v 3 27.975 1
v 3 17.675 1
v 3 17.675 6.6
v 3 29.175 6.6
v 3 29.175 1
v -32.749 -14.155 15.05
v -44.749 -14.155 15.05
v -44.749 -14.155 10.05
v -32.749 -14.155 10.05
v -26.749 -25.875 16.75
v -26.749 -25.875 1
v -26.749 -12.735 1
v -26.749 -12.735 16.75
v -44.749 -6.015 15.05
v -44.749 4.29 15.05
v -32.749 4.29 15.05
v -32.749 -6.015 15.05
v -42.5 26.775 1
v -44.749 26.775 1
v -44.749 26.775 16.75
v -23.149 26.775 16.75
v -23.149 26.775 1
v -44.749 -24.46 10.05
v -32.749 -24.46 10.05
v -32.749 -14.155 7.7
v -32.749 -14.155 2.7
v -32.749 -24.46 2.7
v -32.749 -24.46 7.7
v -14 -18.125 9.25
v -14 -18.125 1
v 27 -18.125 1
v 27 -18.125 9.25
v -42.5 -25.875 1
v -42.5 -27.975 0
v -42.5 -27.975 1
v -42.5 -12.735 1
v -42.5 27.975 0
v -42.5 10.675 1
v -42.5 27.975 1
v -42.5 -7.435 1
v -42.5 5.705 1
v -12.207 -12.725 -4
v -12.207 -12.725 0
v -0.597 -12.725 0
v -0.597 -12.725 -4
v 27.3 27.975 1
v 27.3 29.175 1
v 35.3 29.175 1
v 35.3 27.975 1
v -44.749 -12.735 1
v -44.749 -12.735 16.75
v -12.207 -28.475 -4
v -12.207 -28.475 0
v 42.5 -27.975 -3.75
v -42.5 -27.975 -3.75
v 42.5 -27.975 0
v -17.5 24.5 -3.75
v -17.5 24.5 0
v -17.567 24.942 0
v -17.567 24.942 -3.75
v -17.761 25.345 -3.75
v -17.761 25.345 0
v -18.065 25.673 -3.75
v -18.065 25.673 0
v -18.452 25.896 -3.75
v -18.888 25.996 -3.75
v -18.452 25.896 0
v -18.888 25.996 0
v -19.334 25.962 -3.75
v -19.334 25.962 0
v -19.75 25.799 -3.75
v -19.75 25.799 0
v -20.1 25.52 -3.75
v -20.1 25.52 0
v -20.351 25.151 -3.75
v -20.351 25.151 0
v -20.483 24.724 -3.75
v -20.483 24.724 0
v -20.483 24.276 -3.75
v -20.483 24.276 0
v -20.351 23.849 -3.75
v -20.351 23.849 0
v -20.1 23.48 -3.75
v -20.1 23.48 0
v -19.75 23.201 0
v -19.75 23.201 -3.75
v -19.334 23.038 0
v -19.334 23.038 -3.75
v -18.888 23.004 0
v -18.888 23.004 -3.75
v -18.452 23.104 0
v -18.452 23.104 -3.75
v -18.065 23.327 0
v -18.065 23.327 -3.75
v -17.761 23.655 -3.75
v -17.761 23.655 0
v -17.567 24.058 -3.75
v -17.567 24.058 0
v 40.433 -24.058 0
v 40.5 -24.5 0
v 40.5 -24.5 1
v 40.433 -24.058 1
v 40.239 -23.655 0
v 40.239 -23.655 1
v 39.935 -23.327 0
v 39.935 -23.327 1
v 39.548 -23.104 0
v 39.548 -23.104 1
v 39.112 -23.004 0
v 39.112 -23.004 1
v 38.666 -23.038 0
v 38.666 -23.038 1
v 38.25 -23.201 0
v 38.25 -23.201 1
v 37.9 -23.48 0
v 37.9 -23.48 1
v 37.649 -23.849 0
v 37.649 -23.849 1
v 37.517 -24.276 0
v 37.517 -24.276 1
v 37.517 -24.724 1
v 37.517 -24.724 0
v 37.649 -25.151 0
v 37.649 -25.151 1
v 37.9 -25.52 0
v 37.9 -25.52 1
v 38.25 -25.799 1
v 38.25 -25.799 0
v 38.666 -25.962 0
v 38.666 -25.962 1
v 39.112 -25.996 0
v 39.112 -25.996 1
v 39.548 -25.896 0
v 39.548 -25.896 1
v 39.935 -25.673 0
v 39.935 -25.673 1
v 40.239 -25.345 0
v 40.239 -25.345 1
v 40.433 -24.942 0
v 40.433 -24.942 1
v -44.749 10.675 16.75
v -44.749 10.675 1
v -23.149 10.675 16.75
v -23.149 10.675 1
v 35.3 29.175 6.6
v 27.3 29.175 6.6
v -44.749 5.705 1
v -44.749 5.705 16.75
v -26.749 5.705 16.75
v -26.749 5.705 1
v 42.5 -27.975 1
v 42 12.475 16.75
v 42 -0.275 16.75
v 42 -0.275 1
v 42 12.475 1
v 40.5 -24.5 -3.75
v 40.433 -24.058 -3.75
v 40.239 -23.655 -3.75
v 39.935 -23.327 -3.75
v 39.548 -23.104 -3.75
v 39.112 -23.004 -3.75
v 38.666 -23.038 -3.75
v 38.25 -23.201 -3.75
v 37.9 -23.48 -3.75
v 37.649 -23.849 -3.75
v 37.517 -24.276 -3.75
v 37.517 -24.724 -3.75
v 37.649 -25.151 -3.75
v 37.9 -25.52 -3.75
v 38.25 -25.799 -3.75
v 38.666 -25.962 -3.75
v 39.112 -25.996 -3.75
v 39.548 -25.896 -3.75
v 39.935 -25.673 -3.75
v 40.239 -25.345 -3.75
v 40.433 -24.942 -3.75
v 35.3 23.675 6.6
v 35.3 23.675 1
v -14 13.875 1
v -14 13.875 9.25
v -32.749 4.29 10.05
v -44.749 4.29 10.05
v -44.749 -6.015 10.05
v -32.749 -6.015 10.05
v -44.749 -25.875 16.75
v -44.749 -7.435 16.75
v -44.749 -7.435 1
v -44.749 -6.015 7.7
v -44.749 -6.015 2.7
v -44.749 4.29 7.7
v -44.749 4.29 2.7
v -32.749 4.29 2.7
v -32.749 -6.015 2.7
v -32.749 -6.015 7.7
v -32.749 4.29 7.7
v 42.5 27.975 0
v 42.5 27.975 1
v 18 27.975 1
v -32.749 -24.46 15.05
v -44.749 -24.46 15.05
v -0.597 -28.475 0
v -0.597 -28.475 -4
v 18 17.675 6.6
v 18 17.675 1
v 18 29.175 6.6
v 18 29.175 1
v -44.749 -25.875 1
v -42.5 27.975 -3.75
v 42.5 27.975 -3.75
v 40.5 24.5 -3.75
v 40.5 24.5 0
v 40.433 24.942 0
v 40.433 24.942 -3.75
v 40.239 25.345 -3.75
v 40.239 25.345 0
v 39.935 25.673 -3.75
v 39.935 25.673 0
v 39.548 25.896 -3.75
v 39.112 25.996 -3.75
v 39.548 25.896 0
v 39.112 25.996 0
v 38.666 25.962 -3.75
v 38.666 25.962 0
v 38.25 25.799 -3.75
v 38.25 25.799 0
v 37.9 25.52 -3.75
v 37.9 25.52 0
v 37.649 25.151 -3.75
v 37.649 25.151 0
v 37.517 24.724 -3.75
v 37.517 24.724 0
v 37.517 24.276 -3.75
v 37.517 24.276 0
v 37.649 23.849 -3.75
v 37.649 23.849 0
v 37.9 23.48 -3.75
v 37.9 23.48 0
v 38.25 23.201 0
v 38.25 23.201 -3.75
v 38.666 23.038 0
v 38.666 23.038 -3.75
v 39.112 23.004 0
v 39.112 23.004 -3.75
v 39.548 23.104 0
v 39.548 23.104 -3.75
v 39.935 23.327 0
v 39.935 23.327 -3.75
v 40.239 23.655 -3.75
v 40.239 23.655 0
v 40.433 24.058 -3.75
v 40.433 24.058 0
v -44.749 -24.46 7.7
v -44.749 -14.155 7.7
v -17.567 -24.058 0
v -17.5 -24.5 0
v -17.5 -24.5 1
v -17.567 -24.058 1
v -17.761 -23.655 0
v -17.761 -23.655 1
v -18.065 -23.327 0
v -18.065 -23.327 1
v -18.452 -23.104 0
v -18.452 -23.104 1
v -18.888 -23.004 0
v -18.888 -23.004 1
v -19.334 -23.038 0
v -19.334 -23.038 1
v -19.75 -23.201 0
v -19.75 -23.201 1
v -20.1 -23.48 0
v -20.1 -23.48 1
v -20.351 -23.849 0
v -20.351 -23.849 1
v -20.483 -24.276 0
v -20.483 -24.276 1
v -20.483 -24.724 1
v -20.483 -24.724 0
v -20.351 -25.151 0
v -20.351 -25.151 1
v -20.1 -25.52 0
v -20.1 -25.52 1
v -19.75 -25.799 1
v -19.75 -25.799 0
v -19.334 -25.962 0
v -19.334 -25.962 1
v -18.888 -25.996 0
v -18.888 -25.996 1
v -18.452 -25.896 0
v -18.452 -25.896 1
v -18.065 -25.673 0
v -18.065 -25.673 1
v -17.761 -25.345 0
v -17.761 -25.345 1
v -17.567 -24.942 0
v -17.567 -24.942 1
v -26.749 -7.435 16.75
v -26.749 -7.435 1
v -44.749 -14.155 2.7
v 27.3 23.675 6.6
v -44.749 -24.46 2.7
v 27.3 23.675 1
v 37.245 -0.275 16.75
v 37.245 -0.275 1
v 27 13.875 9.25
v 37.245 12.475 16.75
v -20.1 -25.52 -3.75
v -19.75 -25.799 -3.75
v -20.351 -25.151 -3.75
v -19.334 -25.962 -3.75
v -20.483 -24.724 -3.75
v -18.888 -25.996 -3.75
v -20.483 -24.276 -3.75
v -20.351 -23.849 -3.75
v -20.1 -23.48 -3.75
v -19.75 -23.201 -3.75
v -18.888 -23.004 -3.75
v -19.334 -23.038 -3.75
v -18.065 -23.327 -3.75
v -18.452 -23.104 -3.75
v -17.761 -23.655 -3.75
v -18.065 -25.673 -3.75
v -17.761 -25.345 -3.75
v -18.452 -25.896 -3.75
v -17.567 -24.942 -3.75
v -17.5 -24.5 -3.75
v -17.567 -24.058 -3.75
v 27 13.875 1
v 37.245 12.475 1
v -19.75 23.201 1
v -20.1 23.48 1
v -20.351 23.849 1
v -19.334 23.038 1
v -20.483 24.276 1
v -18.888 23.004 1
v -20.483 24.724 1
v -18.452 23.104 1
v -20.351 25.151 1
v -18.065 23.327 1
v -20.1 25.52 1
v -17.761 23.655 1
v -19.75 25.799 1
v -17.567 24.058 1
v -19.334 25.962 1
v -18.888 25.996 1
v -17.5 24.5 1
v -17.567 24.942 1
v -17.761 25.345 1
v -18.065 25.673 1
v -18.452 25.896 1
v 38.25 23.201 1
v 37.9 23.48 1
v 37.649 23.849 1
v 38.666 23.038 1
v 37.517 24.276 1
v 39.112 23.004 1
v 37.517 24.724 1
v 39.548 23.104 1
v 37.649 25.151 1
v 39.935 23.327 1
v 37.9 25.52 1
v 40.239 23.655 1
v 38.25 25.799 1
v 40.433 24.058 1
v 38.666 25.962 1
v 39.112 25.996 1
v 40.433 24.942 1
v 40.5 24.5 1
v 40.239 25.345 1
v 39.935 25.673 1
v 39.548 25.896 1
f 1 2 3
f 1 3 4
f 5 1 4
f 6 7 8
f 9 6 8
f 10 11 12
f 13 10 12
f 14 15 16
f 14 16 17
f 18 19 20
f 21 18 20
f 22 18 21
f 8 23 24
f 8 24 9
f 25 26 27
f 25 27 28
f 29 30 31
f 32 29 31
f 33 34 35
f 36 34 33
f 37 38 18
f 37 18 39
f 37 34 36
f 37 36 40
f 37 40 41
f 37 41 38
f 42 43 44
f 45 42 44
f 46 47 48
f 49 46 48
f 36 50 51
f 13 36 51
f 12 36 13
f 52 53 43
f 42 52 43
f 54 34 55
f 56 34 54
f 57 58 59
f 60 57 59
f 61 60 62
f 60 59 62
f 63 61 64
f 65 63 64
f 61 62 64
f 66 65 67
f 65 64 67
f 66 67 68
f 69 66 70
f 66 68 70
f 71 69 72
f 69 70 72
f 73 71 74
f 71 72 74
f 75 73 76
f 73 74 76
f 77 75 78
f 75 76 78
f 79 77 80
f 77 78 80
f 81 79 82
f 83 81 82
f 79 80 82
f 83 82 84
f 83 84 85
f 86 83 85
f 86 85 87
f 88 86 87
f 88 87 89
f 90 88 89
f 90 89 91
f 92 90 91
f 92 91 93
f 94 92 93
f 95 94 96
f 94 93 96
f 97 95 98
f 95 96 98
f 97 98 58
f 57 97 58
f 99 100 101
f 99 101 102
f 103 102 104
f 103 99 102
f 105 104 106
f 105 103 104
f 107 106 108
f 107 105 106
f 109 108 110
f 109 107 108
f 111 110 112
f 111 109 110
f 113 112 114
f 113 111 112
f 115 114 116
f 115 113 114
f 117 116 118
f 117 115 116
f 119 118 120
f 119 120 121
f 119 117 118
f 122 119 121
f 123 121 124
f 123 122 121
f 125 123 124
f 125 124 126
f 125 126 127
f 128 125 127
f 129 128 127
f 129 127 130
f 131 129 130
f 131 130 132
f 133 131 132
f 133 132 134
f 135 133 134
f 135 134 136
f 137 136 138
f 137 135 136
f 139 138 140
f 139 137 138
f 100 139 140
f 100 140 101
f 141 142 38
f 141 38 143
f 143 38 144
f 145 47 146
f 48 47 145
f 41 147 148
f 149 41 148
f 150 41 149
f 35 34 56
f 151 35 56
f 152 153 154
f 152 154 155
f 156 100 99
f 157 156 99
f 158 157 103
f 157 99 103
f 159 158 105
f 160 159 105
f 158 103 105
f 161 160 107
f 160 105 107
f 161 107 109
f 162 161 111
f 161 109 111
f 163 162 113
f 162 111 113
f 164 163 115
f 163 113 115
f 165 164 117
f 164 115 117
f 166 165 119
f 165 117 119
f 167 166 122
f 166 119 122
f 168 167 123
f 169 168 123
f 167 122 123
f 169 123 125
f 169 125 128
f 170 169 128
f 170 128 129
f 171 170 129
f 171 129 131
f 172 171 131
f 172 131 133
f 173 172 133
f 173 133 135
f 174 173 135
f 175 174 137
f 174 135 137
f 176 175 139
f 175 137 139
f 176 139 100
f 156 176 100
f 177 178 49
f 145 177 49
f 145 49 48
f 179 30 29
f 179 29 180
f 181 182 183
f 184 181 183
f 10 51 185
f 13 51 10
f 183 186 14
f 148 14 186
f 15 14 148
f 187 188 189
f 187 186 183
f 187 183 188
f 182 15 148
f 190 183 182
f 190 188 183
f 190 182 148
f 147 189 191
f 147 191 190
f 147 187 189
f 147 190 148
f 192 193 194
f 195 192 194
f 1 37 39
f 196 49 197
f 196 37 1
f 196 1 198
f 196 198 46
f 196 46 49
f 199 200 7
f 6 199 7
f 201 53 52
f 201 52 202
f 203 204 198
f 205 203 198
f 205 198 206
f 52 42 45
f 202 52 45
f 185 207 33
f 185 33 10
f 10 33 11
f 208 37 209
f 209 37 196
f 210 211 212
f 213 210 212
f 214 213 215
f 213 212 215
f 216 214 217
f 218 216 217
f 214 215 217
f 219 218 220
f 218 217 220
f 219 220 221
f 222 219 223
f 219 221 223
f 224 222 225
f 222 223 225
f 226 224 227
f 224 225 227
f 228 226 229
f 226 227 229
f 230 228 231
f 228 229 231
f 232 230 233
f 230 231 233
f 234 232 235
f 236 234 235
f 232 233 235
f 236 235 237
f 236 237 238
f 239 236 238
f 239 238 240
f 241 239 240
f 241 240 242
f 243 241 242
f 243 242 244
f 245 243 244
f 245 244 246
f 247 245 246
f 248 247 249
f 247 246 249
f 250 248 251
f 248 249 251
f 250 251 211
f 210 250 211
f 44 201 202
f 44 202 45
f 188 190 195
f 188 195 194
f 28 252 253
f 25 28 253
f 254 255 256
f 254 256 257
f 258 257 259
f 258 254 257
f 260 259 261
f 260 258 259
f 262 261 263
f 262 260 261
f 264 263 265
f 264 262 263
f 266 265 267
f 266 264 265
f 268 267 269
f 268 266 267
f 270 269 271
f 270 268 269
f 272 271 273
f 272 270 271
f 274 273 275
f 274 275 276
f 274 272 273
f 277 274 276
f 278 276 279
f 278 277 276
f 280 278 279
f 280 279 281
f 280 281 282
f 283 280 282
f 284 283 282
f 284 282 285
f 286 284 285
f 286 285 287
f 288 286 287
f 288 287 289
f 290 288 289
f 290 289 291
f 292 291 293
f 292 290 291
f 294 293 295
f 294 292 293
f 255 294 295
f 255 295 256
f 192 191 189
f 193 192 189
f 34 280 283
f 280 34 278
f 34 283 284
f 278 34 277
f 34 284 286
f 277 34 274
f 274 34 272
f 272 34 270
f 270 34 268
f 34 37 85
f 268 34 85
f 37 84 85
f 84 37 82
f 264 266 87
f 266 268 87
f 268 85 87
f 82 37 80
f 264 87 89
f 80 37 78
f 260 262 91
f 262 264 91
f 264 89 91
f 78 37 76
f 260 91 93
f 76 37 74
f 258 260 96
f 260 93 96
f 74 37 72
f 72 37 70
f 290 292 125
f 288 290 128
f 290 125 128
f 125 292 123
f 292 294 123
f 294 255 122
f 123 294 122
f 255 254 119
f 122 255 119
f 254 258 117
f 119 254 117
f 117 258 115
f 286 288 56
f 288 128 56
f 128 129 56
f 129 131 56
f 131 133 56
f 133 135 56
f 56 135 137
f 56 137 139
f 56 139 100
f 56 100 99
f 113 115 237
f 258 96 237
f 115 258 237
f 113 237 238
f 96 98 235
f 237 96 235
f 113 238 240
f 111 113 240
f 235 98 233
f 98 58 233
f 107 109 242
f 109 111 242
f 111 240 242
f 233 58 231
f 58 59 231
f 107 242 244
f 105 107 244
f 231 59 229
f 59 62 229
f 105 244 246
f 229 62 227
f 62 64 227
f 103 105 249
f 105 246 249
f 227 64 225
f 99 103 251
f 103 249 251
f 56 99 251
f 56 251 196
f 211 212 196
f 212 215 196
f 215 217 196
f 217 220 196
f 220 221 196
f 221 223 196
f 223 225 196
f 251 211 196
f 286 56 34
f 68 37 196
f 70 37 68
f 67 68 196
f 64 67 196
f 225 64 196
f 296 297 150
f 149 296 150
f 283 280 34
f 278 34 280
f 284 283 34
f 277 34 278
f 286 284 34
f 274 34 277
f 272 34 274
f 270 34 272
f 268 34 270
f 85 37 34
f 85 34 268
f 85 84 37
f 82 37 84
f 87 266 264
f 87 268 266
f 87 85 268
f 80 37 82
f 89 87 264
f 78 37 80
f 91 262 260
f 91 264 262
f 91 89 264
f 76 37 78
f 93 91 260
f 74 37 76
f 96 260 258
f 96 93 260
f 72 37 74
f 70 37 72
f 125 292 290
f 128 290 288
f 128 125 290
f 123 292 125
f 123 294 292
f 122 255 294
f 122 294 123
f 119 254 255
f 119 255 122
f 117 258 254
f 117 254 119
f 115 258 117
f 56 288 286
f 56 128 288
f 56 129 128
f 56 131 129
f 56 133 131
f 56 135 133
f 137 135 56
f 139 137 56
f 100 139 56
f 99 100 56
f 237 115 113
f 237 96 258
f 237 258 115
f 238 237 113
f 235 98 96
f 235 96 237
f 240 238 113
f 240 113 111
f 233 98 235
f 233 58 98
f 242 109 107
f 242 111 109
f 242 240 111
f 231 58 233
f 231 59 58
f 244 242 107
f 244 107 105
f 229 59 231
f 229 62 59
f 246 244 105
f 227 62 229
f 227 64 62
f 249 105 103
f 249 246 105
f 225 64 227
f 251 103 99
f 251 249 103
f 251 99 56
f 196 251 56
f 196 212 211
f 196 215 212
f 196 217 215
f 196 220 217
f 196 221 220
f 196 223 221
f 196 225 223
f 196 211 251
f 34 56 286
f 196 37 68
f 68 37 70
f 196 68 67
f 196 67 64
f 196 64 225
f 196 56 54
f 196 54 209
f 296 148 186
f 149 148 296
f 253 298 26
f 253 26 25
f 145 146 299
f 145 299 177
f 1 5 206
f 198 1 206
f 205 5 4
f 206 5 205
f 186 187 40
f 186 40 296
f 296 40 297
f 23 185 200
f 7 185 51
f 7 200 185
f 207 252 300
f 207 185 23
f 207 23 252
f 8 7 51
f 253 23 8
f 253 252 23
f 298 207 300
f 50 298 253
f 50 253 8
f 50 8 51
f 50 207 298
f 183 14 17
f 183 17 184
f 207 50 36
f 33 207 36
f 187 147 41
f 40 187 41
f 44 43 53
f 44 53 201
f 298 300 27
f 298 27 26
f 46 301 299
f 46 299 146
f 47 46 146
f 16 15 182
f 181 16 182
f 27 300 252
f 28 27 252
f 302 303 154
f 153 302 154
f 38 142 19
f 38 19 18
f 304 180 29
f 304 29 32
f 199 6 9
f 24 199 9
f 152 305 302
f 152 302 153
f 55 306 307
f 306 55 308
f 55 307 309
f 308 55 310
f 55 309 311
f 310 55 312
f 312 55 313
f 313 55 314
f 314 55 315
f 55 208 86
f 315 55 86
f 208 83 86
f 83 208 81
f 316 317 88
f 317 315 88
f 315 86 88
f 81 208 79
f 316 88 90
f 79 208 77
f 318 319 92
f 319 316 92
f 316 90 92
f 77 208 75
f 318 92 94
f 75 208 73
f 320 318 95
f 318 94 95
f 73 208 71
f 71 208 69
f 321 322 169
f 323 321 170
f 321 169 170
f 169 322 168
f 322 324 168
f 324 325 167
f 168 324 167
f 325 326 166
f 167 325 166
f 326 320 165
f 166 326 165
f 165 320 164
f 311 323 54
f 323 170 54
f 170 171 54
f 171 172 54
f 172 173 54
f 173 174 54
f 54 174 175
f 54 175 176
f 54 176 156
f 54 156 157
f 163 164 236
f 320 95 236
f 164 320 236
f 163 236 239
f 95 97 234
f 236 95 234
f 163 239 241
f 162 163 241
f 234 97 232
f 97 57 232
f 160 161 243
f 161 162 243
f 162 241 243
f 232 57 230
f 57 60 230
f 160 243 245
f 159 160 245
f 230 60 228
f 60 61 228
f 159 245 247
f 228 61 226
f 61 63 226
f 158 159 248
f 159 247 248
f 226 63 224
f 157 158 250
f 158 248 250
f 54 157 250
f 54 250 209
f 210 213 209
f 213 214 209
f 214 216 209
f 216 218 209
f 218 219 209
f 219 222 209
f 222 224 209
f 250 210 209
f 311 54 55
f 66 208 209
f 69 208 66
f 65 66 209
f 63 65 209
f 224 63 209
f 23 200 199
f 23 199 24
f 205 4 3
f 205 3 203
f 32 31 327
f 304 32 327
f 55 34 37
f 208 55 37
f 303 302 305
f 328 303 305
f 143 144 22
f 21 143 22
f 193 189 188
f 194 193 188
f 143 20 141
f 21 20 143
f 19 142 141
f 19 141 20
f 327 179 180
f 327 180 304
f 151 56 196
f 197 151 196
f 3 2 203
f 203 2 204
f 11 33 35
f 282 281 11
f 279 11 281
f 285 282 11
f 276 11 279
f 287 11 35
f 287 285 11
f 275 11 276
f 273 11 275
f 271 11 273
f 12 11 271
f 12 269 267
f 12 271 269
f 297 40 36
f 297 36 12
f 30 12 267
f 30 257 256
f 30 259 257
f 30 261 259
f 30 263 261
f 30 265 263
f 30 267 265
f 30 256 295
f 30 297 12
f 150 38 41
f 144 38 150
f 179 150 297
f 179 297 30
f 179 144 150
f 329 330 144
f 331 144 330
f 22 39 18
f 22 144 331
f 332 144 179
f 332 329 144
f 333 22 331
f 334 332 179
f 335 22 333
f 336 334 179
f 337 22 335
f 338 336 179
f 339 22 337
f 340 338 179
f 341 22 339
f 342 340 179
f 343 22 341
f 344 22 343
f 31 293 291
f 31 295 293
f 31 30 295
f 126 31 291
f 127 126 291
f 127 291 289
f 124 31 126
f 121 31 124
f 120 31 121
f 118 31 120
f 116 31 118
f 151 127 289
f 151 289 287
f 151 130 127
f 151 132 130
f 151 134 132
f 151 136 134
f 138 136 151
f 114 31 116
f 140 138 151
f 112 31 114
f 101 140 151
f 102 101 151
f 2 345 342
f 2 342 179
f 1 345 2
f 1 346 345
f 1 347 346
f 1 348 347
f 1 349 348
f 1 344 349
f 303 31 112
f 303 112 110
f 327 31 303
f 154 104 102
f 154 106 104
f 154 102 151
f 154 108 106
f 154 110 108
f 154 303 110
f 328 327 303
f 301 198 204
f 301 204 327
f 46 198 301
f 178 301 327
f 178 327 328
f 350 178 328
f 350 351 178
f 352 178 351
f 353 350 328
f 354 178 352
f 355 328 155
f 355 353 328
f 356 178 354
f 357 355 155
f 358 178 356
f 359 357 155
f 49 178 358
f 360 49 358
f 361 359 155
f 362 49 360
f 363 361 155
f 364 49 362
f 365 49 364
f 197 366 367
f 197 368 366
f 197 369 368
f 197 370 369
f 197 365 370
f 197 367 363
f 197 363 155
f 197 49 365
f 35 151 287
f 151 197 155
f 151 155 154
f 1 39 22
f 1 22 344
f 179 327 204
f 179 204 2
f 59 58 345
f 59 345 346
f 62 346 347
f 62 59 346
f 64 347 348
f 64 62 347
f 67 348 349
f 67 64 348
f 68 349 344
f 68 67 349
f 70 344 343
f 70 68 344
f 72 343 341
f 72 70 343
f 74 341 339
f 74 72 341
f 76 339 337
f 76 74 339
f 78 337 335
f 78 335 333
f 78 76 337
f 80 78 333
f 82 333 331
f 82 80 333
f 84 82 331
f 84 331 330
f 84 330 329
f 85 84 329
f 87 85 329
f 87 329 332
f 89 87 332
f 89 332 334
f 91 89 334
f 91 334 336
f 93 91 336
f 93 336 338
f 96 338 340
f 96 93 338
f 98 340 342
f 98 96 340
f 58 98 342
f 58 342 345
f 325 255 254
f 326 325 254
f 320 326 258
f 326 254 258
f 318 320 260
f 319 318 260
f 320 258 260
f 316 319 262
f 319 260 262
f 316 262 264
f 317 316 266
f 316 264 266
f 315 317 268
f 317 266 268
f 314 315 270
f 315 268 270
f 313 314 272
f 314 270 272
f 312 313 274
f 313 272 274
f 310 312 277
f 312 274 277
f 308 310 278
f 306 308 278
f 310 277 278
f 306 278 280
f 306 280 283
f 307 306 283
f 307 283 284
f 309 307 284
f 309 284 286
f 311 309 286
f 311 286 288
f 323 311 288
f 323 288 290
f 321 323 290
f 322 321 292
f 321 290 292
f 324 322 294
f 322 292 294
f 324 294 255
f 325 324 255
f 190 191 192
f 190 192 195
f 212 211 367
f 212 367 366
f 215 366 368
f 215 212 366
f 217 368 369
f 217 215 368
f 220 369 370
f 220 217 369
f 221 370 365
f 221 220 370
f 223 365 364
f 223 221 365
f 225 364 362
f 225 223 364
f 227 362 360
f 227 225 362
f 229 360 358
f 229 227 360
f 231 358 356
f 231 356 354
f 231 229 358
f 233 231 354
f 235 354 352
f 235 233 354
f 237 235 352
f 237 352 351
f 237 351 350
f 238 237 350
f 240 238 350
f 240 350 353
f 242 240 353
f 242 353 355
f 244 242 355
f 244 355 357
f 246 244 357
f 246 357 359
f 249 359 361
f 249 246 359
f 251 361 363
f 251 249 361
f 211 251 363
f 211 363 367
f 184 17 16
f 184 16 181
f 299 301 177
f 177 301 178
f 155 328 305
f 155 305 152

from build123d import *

# Parameters (mm, degrees)
SKETCH1_W                         = 85
SKETCH1_H                         = 55.95
SKETCH1_R                         = 1.5
BOSS_EXTRUDE1_DEPTH               = 1
SKETCH1_2_W                       = 85
SKETCH1_2_H                       = 55.95
SKETCH1_2_R                       = 1.5
BOSS_EXTRUDE2_LOWER_KEEPOUT_DEPTH = 3.75
SKETCH3_W                         = 41
SKETCH3_H                         = 32
BOSS_EXTRUDE3_DEPTH               = 8.25
SKETCH4_W                         = 18
SKETCH4_H                         = 13.14
SKETCH4_W_2                       = 4.755
SKETCH4_H_2                       = 12.75
SKETCH4_W_3                       = 21.6
SKETCH4_H_3                       = 16.1
BOSS_EXTRUDE4_DEPTH               = 15.75
SKETCH5_W                         = 15
SKETCH5_H                         = 11.5
SKETCH5_W_2                       = 8
SKETCH5_H_2                       = 5.5
BOSS_EXTRUDE5_DEPTH               = 5.6
SKETCH6_W                         = 11.61
SKETCH6_H                         = 15.75
BOSS_EXTRUDE6_DEPTH               = 4
SKETCH7_W                         = 5
SKETCH7_H                         = 10.304554558
CUT_EXTRUDE1_DEPTH                = 12
MIRROR2_COPY_1_SKETCH_W           = 5
MIRROR2_COPY_1_SKETCH_H           = 10.304554558
MIRROR2_COPY_1_DEPTH              = 12
MIRROR2_COPY_2_SKETCH_W           = 5
MIRROR2_COPY_2_SKETCH_H           = 10.304554558
MIRROR2_COPY_2_DEPTH              = 12


with BuildPart() as part:
    # Sketch1 → Boss-Extrude1 (new body)
    with BuildSketch(Plane.XY):
        Rectangle(SKETCH1_W, SKETCH1_H)
        with Locations((-19.000000078, 24.5)):
            Circle(SKETCH1_R, mode=Mode.SUBTRACT)
        with Locations((-19.000000078, -24.5)):
            Circle(SKETCH1_R, mode=Mode.SUBTRACT)
        with Locations((39, 24.5)):
            Circle(SKETCH1_R, mode=Mode.SUBTRACT)
        with Locations((39, -24.5)):
            Circle(SKETCH1_R, mode=Mode.SUBTRACT)
    extrude(amount=BOSS_EXTRUDE1_DEPTH)

    # Sketch3 → Boss-Extrude3 (add)
    with BuildSketch(Plane.XY.offset(1)):
        with Locations((6.5, -2.125)):
            Rectangle(SKETCH3_W, SKETCH3_H)
    extrude(amount=BOSS_EXTRUDE3_DEPTH)

    # Sketch4 → Boss-Extrude4 (add)
    with BuildSketch(Plane.XY.offset(1)):
        with Locations((-35.74947609, -0.865)):
            Rectangle(SKETCH4_W, SKETCH4_H)
        with Locations((-35.74947609, -19.305)):
            Rectangle(SKETCH4_W, SKETCH4_H)
        with Locations((39.6225, 6.1)):
            Rectangle(SKETCH4_W_2, SKETCH4_H_2)
        with Locations((-33.94947609, 18.725)):
            Rectangle(SKETCH4_W_3, SKETCH4_H_3)
    extrude(amount=BOSS_EXTRUDE4_DEPTH)

    # Sketch5 → Boss-Extrude5 (add)
    with BuildSketch(Plane.XY.offset(1)):
        with Locations((10.5, 23.425)):
            Rectangle(SKETCH5_W, SKETCH5_H)
        with Locations((31.3, 26.425)):
            Rectangle(SKETCH5_W_2, SKETCH5_H_2)
    extrude(amount=BOSS_EXTRUDE5_DEPTH)

    # Sketch7 → Cut-Extrude1 (cut)
    with BuildSketch(Plane.ZY.offset(44.74947609)):
        with Locations((5.2, -19.307277279)):
            Rectangle(SKETCH7_W, SKETCH7_H)
    cut_extrude1 = extrude(amount=-CUT_EXTRUDE1_DEPTH, mode=Mode.SUBTRACT)

    # Mirror1: Cut-Extrude1 across plane
    add(cut_extrude1.mirror(Plane.XY.offset(8.875)), mode=Mode.SUBTRACT)

    # Mirror2 copy 1 sketch → Mirror2 copy 1 (cut)
    with BuildSketch(Plane(origin=(-44.74947609, -20.17, 17.75), x_dir=(0, 0, -1), z_dir=(-1, 0, 0))):
        with Locations((5.2, -19.307277279)):
            Rectangle(MIRROR2_COPY_1_SKETCH_W, MIRROR2_COPY_1_SKETCH_H)
    extrude(amount=-MIRROR2_COPY_1_DEPTH, mode=Mode.SUBTRACT)

    # Mirror2 copy 2 sketch → Mirror2 copy 2 (cut)
    with BuildSketch(Plane(origin=(-44.74947609, -20.17, 0), x_dir=(0, 0, 1), z_dir=(-1, 0, 0))):
        with Locations((5.2, 19.307277279)):
            Rectangle(MIRROR2_COPY_2_SKETCH_W, MIRROR2_COPY_2_SKETCH_H)
    extrude(amount=-MIRROR2_COPY_2_DEPTH, mode=Mode.SUBTRACT)


with BuildPart() as body_2:
    # Sketch1<2> → Boss-Extrude2-lower-keepout (new body)
    with BuildSketch(Plane.XY):
        Rectangle(SKETCH1_2_W, SKETCH1_2_H)
        with Locations((-19.000000078, 24.5)):
            Circle(SKETCH1_2_R, mode=Mode.SUBTRACT)
        with Locations((-19.000000078, -24.5)):
            Circle(SKETCH1_2_R, mode=Mode.SUBTRACT)
        with Locations((39, 24.5)):
            Circle(SKETCH1_2_R, mode=Mode.SUBTRACT)
        with Locations((39, -24.5)):
            Circle(SKETCH1_2_R, mode=Mode.SUBTRACT)
    extrude(amount=-BOSS_EXTRUDE2_LOWER_KEEPOUT_DEPTH)


with BuildPart() as body_3:
    # Sketch6 → Boss-Extrude6 (new body)
    with BuildSketch(Plane.XY):
        with Locations((-6.401910681, -20.6)):
            Rectangle(SKETCH6_W, SKETCH6_H)
    extrude(amount=-BOSS_EXTRUDE6_DEPTH)


solid = Compound([part.part, body_2.part, body_3.part])
